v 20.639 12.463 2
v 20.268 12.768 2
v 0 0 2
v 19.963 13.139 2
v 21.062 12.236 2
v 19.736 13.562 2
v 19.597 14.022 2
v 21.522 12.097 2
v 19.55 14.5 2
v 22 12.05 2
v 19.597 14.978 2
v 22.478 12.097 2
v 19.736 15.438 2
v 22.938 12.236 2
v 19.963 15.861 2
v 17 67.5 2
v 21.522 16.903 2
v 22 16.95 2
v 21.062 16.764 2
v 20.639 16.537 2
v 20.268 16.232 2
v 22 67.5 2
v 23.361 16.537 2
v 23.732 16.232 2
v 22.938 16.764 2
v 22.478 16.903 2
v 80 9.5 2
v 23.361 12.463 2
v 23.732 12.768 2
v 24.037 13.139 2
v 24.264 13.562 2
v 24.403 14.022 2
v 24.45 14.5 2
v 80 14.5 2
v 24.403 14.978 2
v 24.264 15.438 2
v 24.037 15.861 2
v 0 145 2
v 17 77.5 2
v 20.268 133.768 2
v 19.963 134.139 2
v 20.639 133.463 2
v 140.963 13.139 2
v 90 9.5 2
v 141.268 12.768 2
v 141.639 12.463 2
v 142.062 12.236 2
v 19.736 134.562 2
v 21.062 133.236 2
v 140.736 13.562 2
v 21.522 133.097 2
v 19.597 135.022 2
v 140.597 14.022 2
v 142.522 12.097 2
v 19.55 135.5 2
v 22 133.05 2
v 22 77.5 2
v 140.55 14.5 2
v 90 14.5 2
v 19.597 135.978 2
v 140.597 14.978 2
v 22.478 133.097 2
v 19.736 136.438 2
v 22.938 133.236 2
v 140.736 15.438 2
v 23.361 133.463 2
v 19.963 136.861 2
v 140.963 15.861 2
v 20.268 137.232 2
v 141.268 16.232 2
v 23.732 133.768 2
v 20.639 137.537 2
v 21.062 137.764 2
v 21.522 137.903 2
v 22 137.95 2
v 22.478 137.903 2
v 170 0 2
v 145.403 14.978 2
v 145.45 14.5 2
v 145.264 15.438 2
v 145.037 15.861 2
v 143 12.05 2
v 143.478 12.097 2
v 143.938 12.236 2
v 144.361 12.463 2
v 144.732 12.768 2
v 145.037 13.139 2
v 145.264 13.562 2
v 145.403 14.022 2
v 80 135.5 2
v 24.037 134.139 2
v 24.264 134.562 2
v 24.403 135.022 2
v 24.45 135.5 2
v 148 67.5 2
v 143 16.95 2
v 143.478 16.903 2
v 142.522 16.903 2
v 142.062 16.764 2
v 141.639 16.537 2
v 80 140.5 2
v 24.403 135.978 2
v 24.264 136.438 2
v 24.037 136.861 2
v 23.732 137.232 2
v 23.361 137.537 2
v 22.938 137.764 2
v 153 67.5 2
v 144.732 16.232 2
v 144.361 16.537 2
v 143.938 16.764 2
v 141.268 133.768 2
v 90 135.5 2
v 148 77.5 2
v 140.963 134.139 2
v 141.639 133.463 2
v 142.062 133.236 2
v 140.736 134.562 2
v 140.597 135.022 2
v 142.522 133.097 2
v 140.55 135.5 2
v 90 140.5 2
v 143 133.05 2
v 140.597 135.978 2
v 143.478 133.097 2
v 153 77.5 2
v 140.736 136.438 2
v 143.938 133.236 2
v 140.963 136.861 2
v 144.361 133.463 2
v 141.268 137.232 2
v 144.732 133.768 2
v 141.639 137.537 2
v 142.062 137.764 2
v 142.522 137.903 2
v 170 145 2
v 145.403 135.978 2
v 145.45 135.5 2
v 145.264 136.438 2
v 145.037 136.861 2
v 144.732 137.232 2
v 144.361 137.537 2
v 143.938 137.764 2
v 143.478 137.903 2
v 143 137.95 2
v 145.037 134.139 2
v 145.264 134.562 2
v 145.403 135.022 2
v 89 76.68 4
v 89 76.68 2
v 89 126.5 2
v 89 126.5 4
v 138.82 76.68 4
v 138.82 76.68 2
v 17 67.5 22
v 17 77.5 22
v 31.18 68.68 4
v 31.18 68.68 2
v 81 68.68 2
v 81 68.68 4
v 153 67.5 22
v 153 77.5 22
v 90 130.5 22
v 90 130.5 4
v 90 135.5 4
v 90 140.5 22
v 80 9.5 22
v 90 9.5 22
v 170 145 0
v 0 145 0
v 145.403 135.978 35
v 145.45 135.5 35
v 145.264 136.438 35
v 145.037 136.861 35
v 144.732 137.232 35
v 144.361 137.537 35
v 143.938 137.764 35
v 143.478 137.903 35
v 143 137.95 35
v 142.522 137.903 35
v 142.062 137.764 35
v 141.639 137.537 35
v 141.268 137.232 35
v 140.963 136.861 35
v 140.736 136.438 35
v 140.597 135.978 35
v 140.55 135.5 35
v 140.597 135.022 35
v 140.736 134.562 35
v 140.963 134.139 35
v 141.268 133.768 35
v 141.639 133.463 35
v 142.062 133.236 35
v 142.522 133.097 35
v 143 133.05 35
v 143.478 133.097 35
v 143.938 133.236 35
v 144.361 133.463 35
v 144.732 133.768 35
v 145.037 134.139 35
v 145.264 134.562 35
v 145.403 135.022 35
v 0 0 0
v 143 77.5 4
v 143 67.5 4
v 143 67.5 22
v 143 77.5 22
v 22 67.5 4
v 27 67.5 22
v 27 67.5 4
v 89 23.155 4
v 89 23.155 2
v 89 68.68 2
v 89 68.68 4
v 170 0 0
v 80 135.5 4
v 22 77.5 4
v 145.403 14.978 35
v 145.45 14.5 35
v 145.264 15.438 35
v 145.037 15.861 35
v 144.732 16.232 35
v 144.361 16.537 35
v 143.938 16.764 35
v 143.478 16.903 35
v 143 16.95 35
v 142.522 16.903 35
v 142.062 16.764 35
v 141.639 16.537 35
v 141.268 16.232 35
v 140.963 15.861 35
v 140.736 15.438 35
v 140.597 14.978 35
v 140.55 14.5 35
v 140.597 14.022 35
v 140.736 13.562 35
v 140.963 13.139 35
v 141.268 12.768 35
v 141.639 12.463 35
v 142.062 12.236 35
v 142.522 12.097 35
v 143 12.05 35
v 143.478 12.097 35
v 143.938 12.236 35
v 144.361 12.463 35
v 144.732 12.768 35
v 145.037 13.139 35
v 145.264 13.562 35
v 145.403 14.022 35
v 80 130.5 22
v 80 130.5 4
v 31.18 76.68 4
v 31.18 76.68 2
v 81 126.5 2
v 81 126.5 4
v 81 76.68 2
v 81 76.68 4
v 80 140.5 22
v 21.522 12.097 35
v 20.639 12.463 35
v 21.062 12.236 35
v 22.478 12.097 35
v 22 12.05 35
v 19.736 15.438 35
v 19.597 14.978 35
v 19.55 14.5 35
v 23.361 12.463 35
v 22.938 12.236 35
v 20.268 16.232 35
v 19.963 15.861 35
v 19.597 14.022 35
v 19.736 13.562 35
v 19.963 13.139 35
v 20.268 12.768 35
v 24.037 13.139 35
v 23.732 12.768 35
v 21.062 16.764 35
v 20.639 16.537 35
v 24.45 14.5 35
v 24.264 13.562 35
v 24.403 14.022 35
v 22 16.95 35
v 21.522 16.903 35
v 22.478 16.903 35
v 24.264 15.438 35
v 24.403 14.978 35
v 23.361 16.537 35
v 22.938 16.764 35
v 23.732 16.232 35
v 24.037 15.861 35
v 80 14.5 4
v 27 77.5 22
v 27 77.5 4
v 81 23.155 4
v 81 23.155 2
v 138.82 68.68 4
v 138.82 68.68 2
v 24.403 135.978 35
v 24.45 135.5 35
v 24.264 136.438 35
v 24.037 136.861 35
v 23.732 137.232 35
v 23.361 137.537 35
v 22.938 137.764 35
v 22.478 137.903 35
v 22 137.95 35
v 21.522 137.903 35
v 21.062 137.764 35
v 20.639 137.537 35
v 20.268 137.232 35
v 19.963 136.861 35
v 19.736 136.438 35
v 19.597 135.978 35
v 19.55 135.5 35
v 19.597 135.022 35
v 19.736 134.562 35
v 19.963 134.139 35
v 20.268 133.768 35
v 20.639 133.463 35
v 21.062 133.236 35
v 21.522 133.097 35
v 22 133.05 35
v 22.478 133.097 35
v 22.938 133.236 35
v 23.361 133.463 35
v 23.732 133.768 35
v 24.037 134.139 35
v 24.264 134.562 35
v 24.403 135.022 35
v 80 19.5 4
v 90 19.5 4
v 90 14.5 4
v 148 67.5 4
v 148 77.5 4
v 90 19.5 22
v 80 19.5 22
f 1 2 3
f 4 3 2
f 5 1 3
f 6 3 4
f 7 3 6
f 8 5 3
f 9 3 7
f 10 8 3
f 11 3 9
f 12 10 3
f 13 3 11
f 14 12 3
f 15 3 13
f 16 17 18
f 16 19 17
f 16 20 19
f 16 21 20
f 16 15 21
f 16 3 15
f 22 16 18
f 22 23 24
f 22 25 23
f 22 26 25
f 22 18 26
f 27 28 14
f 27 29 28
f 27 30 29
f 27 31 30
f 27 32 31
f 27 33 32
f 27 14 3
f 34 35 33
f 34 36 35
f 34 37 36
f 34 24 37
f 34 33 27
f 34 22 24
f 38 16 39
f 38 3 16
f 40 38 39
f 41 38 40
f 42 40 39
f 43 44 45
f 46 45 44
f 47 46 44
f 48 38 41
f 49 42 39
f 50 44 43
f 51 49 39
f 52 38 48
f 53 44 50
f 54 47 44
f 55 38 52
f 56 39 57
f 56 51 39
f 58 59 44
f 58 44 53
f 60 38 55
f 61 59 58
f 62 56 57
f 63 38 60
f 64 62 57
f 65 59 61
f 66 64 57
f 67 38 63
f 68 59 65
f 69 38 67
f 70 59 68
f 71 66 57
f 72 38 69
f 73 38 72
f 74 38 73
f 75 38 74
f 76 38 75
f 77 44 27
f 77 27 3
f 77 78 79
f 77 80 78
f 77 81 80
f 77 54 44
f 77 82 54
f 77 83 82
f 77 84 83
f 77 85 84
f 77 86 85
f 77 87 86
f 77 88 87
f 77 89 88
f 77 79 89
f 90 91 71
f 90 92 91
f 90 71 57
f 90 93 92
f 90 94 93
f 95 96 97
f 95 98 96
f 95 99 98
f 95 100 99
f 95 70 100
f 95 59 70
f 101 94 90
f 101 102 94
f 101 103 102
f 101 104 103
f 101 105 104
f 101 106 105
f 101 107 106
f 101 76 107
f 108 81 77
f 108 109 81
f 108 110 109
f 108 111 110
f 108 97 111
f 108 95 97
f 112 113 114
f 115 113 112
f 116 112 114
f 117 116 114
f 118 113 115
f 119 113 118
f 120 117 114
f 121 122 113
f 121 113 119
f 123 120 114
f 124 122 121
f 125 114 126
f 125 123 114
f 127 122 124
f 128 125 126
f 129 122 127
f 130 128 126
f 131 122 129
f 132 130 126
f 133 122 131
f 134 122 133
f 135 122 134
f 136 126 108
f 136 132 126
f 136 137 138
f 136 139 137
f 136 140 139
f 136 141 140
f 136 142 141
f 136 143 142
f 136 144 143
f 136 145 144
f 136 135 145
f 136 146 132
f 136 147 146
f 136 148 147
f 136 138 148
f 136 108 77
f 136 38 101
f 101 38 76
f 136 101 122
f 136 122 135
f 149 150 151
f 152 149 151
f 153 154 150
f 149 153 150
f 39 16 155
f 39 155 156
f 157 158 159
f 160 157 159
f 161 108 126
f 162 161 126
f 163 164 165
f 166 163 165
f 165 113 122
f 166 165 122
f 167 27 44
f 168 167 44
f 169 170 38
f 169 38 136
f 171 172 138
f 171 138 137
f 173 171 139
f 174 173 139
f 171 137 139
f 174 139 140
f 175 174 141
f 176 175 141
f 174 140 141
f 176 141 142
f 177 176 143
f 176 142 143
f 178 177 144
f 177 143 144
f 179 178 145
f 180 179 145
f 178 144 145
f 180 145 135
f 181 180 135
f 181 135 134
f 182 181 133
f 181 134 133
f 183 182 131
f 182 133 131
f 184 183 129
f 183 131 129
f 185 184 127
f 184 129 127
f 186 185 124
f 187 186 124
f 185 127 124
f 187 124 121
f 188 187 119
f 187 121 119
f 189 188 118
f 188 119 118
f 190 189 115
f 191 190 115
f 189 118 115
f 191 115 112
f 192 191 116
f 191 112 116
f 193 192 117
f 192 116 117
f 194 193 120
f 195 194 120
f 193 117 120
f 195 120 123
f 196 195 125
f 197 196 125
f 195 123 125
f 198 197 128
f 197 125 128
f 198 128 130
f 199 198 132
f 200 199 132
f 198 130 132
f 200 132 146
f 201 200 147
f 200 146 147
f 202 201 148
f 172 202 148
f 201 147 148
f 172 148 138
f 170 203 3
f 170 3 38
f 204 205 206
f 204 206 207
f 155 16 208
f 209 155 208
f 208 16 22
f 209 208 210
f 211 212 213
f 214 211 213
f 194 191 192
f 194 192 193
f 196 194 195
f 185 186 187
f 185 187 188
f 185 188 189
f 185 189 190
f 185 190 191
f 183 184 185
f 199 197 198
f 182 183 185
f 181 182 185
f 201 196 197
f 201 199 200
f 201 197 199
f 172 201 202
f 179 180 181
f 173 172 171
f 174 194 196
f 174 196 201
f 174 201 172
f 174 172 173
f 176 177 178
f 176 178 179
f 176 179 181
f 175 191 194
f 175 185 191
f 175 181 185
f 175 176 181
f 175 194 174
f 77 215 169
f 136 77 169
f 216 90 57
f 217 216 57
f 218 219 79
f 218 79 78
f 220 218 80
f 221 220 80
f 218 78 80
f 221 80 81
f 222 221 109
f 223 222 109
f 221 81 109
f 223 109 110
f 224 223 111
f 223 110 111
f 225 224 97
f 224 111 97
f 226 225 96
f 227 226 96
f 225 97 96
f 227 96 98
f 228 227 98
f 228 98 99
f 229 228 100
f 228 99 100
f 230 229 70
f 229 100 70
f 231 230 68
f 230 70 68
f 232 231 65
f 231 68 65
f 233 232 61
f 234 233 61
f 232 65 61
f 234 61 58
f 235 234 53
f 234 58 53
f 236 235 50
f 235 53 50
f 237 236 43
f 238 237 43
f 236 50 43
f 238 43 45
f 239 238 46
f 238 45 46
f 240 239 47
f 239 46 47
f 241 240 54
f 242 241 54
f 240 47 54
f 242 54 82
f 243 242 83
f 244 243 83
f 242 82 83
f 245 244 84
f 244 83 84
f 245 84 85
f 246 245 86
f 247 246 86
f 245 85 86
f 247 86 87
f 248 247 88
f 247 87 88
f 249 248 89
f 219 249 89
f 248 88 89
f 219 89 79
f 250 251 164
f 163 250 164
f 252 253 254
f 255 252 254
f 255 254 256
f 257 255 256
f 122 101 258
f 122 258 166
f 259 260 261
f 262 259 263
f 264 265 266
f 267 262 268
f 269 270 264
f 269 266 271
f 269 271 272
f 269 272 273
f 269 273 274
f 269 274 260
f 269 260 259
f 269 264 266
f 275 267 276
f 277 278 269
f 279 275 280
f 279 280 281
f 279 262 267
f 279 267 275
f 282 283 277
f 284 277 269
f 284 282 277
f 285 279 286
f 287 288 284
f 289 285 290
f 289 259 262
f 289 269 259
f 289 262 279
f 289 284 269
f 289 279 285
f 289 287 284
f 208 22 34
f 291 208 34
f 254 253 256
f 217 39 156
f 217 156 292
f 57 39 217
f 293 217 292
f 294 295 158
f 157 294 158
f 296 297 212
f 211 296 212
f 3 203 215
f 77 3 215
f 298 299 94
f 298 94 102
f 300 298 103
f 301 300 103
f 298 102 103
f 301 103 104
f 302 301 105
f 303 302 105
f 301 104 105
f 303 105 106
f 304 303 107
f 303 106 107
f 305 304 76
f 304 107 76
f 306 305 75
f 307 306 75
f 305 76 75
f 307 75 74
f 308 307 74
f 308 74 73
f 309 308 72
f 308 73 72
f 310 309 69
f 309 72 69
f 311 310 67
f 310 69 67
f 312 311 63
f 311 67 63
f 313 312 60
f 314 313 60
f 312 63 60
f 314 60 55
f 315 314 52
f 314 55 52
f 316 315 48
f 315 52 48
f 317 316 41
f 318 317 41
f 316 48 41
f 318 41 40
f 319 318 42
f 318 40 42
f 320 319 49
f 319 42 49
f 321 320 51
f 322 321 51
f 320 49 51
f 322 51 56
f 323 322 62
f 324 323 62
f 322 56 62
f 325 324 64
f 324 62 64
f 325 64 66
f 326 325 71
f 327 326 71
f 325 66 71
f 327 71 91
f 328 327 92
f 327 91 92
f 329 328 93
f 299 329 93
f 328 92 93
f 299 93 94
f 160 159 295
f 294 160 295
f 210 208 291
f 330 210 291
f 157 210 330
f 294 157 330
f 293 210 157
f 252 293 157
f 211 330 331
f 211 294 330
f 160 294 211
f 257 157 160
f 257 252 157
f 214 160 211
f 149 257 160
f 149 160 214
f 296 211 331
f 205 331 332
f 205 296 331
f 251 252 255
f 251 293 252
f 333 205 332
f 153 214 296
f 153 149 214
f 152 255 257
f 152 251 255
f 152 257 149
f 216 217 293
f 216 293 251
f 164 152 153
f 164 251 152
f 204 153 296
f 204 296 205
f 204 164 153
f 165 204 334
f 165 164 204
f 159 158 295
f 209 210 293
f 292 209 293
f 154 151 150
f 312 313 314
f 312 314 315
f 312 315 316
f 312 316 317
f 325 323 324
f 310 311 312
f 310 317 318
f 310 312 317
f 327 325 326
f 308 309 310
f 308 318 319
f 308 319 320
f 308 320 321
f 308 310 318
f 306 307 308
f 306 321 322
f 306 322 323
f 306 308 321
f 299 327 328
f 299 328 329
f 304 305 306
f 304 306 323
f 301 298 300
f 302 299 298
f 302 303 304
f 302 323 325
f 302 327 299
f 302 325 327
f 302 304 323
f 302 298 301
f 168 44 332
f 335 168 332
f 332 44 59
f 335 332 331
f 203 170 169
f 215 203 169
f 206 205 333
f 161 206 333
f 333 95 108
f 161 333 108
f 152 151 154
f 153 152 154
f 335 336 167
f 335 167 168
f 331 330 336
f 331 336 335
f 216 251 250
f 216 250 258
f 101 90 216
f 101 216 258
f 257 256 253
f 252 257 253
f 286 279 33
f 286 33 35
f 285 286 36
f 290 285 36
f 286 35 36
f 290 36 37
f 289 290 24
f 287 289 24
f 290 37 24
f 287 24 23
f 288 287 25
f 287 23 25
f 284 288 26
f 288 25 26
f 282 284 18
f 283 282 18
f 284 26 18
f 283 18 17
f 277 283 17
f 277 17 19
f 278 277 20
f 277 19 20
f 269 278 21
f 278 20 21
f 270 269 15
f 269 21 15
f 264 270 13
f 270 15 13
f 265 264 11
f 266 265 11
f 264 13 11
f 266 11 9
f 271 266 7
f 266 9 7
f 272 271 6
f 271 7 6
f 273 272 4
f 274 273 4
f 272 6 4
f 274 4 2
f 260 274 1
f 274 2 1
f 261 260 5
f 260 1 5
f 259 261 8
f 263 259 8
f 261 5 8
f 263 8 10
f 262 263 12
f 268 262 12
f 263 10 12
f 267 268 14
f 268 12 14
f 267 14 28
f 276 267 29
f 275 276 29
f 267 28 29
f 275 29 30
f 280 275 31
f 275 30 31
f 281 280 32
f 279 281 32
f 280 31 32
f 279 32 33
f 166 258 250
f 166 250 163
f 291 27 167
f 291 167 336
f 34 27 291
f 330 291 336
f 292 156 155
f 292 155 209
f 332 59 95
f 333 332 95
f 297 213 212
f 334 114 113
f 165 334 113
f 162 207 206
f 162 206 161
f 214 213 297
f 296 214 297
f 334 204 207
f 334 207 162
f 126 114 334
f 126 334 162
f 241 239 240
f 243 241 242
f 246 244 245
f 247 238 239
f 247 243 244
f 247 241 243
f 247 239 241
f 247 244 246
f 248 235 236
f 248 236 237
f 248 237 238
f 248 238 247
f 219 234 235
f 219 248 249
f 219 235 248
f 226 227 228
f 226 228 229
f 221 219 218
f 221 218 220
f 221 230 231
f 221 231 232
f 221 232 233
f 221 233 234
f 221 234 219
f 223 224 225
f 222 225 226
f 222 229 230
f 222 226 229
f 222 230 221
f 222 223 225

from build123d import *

# Parameters (mm, degrees)
F0_W      = 170
F0_H      = 145
F1_DEPTH  = 2
F2_R      = 2.45
F3_DEPTH  = 33
F4_W      = 10
F4_H      = 10
F5_DEPTH  = 20
F8_DEPTH  = 2
F9_W      = 8
F9_H      = 8
F10_DEPTH = 2


with BuildPart() as f1:
    # F0 (on Top) → F1 (new body)
    with BuildSketch(Plane.XY):
        with Locations((85, 72.5)):
            Rectangle(F0_W, F0_H)
    extrude(amount=F1_DEPTH)

    # F2 (on face) → F3 (join)
    with BuildSketch(Plane.XY.offset(2)):
        with Locations((22, 135.5)):
            Circle(F2_R)
        with Locations((22, 14.5)):
            Circle(F2_R)
        with Locations((143, 135.5)):
            Circle(F2_R)
        with Locations((143, 14.5)):
            Circle(F2_R)
    extrude(amount=F3_DEPTH)

    # F4 (on face) → F5 (join)
    with BuildSketch(Plane.XY.offset(2)):
        with Locations((85, 14.5)):
            Rectangle(F4_W, F4_H)
        with Locations((85, 135.5)):
            Rectangle(F4_W, F4_H)
        with Locations((22, 72.5)):
            Rectangle(F4_W, F4_H)
        with Locations((148, 72.5)):
            Rectangle(F4_W, F4_H)
    extrude(amount=F5_DEPTH)

    # F7 (on face) → F8 (join)
    with BuildSketch(Plane.XY.offset(2)):
        Polygon((85, 19.5), (27, 72.5), (27, 67.5), (22, 67.5), (80, 14.5), (80, 19.5), align=None)
        Polygon((143, 72.5), (85, 19.5), (90, 19.5), (90, 14.5), (148, 67.5), (143, 67.5), align=None)
        Polygon((90, 130.5), (85, 130.5), (143, 72.5), (143, 77.5), (148, 77.5), (90, 135.5), align=None)
        Polygon((27, 77.5), (27, 72.5), (85, 130.5), (80, 130.5), (80, 135.5), (22, 77.5), align=None)
    extrude(amount=F8_DEPTH)

    # F9 (on face) → F10 (join)
    with BuildSketch(Plane.XY.offset(2)):
        Polygon((31.1801801802, 68.6801801802), (81, 68.6801801802), (81, 76.6801801802), (31.1801801802, 76.6801801802), (27, 72.5), align=None)
        Polygon((81, 126.5), (81, 76.6801801802), (89, 76.6801801802), (89, 126.5), (85, 130.5), align=None)
        with Locations((85, 72.6801801802)):
            Rectangle(F9_W, F9_H)
        Polygon((143, 72.5), (138.8198198198, 68.6801801802), (139.1801801802, 68.6801801802), align=None)
        Polygon((89, 76.6801801802), (89, 68.6801801802), (138.8198198198, 68.6801801802), (143, 72.5), (138.8198198198, 76.6801801802), align=None)
        Polygon((81, 68.6801801802), (81, 23.1551724138), (85, 19.5), (89, 23.1551724138), (89, 68.6801801802), align=None)
    extrude(amount=F10_DEPTH)


solid = f1.part
